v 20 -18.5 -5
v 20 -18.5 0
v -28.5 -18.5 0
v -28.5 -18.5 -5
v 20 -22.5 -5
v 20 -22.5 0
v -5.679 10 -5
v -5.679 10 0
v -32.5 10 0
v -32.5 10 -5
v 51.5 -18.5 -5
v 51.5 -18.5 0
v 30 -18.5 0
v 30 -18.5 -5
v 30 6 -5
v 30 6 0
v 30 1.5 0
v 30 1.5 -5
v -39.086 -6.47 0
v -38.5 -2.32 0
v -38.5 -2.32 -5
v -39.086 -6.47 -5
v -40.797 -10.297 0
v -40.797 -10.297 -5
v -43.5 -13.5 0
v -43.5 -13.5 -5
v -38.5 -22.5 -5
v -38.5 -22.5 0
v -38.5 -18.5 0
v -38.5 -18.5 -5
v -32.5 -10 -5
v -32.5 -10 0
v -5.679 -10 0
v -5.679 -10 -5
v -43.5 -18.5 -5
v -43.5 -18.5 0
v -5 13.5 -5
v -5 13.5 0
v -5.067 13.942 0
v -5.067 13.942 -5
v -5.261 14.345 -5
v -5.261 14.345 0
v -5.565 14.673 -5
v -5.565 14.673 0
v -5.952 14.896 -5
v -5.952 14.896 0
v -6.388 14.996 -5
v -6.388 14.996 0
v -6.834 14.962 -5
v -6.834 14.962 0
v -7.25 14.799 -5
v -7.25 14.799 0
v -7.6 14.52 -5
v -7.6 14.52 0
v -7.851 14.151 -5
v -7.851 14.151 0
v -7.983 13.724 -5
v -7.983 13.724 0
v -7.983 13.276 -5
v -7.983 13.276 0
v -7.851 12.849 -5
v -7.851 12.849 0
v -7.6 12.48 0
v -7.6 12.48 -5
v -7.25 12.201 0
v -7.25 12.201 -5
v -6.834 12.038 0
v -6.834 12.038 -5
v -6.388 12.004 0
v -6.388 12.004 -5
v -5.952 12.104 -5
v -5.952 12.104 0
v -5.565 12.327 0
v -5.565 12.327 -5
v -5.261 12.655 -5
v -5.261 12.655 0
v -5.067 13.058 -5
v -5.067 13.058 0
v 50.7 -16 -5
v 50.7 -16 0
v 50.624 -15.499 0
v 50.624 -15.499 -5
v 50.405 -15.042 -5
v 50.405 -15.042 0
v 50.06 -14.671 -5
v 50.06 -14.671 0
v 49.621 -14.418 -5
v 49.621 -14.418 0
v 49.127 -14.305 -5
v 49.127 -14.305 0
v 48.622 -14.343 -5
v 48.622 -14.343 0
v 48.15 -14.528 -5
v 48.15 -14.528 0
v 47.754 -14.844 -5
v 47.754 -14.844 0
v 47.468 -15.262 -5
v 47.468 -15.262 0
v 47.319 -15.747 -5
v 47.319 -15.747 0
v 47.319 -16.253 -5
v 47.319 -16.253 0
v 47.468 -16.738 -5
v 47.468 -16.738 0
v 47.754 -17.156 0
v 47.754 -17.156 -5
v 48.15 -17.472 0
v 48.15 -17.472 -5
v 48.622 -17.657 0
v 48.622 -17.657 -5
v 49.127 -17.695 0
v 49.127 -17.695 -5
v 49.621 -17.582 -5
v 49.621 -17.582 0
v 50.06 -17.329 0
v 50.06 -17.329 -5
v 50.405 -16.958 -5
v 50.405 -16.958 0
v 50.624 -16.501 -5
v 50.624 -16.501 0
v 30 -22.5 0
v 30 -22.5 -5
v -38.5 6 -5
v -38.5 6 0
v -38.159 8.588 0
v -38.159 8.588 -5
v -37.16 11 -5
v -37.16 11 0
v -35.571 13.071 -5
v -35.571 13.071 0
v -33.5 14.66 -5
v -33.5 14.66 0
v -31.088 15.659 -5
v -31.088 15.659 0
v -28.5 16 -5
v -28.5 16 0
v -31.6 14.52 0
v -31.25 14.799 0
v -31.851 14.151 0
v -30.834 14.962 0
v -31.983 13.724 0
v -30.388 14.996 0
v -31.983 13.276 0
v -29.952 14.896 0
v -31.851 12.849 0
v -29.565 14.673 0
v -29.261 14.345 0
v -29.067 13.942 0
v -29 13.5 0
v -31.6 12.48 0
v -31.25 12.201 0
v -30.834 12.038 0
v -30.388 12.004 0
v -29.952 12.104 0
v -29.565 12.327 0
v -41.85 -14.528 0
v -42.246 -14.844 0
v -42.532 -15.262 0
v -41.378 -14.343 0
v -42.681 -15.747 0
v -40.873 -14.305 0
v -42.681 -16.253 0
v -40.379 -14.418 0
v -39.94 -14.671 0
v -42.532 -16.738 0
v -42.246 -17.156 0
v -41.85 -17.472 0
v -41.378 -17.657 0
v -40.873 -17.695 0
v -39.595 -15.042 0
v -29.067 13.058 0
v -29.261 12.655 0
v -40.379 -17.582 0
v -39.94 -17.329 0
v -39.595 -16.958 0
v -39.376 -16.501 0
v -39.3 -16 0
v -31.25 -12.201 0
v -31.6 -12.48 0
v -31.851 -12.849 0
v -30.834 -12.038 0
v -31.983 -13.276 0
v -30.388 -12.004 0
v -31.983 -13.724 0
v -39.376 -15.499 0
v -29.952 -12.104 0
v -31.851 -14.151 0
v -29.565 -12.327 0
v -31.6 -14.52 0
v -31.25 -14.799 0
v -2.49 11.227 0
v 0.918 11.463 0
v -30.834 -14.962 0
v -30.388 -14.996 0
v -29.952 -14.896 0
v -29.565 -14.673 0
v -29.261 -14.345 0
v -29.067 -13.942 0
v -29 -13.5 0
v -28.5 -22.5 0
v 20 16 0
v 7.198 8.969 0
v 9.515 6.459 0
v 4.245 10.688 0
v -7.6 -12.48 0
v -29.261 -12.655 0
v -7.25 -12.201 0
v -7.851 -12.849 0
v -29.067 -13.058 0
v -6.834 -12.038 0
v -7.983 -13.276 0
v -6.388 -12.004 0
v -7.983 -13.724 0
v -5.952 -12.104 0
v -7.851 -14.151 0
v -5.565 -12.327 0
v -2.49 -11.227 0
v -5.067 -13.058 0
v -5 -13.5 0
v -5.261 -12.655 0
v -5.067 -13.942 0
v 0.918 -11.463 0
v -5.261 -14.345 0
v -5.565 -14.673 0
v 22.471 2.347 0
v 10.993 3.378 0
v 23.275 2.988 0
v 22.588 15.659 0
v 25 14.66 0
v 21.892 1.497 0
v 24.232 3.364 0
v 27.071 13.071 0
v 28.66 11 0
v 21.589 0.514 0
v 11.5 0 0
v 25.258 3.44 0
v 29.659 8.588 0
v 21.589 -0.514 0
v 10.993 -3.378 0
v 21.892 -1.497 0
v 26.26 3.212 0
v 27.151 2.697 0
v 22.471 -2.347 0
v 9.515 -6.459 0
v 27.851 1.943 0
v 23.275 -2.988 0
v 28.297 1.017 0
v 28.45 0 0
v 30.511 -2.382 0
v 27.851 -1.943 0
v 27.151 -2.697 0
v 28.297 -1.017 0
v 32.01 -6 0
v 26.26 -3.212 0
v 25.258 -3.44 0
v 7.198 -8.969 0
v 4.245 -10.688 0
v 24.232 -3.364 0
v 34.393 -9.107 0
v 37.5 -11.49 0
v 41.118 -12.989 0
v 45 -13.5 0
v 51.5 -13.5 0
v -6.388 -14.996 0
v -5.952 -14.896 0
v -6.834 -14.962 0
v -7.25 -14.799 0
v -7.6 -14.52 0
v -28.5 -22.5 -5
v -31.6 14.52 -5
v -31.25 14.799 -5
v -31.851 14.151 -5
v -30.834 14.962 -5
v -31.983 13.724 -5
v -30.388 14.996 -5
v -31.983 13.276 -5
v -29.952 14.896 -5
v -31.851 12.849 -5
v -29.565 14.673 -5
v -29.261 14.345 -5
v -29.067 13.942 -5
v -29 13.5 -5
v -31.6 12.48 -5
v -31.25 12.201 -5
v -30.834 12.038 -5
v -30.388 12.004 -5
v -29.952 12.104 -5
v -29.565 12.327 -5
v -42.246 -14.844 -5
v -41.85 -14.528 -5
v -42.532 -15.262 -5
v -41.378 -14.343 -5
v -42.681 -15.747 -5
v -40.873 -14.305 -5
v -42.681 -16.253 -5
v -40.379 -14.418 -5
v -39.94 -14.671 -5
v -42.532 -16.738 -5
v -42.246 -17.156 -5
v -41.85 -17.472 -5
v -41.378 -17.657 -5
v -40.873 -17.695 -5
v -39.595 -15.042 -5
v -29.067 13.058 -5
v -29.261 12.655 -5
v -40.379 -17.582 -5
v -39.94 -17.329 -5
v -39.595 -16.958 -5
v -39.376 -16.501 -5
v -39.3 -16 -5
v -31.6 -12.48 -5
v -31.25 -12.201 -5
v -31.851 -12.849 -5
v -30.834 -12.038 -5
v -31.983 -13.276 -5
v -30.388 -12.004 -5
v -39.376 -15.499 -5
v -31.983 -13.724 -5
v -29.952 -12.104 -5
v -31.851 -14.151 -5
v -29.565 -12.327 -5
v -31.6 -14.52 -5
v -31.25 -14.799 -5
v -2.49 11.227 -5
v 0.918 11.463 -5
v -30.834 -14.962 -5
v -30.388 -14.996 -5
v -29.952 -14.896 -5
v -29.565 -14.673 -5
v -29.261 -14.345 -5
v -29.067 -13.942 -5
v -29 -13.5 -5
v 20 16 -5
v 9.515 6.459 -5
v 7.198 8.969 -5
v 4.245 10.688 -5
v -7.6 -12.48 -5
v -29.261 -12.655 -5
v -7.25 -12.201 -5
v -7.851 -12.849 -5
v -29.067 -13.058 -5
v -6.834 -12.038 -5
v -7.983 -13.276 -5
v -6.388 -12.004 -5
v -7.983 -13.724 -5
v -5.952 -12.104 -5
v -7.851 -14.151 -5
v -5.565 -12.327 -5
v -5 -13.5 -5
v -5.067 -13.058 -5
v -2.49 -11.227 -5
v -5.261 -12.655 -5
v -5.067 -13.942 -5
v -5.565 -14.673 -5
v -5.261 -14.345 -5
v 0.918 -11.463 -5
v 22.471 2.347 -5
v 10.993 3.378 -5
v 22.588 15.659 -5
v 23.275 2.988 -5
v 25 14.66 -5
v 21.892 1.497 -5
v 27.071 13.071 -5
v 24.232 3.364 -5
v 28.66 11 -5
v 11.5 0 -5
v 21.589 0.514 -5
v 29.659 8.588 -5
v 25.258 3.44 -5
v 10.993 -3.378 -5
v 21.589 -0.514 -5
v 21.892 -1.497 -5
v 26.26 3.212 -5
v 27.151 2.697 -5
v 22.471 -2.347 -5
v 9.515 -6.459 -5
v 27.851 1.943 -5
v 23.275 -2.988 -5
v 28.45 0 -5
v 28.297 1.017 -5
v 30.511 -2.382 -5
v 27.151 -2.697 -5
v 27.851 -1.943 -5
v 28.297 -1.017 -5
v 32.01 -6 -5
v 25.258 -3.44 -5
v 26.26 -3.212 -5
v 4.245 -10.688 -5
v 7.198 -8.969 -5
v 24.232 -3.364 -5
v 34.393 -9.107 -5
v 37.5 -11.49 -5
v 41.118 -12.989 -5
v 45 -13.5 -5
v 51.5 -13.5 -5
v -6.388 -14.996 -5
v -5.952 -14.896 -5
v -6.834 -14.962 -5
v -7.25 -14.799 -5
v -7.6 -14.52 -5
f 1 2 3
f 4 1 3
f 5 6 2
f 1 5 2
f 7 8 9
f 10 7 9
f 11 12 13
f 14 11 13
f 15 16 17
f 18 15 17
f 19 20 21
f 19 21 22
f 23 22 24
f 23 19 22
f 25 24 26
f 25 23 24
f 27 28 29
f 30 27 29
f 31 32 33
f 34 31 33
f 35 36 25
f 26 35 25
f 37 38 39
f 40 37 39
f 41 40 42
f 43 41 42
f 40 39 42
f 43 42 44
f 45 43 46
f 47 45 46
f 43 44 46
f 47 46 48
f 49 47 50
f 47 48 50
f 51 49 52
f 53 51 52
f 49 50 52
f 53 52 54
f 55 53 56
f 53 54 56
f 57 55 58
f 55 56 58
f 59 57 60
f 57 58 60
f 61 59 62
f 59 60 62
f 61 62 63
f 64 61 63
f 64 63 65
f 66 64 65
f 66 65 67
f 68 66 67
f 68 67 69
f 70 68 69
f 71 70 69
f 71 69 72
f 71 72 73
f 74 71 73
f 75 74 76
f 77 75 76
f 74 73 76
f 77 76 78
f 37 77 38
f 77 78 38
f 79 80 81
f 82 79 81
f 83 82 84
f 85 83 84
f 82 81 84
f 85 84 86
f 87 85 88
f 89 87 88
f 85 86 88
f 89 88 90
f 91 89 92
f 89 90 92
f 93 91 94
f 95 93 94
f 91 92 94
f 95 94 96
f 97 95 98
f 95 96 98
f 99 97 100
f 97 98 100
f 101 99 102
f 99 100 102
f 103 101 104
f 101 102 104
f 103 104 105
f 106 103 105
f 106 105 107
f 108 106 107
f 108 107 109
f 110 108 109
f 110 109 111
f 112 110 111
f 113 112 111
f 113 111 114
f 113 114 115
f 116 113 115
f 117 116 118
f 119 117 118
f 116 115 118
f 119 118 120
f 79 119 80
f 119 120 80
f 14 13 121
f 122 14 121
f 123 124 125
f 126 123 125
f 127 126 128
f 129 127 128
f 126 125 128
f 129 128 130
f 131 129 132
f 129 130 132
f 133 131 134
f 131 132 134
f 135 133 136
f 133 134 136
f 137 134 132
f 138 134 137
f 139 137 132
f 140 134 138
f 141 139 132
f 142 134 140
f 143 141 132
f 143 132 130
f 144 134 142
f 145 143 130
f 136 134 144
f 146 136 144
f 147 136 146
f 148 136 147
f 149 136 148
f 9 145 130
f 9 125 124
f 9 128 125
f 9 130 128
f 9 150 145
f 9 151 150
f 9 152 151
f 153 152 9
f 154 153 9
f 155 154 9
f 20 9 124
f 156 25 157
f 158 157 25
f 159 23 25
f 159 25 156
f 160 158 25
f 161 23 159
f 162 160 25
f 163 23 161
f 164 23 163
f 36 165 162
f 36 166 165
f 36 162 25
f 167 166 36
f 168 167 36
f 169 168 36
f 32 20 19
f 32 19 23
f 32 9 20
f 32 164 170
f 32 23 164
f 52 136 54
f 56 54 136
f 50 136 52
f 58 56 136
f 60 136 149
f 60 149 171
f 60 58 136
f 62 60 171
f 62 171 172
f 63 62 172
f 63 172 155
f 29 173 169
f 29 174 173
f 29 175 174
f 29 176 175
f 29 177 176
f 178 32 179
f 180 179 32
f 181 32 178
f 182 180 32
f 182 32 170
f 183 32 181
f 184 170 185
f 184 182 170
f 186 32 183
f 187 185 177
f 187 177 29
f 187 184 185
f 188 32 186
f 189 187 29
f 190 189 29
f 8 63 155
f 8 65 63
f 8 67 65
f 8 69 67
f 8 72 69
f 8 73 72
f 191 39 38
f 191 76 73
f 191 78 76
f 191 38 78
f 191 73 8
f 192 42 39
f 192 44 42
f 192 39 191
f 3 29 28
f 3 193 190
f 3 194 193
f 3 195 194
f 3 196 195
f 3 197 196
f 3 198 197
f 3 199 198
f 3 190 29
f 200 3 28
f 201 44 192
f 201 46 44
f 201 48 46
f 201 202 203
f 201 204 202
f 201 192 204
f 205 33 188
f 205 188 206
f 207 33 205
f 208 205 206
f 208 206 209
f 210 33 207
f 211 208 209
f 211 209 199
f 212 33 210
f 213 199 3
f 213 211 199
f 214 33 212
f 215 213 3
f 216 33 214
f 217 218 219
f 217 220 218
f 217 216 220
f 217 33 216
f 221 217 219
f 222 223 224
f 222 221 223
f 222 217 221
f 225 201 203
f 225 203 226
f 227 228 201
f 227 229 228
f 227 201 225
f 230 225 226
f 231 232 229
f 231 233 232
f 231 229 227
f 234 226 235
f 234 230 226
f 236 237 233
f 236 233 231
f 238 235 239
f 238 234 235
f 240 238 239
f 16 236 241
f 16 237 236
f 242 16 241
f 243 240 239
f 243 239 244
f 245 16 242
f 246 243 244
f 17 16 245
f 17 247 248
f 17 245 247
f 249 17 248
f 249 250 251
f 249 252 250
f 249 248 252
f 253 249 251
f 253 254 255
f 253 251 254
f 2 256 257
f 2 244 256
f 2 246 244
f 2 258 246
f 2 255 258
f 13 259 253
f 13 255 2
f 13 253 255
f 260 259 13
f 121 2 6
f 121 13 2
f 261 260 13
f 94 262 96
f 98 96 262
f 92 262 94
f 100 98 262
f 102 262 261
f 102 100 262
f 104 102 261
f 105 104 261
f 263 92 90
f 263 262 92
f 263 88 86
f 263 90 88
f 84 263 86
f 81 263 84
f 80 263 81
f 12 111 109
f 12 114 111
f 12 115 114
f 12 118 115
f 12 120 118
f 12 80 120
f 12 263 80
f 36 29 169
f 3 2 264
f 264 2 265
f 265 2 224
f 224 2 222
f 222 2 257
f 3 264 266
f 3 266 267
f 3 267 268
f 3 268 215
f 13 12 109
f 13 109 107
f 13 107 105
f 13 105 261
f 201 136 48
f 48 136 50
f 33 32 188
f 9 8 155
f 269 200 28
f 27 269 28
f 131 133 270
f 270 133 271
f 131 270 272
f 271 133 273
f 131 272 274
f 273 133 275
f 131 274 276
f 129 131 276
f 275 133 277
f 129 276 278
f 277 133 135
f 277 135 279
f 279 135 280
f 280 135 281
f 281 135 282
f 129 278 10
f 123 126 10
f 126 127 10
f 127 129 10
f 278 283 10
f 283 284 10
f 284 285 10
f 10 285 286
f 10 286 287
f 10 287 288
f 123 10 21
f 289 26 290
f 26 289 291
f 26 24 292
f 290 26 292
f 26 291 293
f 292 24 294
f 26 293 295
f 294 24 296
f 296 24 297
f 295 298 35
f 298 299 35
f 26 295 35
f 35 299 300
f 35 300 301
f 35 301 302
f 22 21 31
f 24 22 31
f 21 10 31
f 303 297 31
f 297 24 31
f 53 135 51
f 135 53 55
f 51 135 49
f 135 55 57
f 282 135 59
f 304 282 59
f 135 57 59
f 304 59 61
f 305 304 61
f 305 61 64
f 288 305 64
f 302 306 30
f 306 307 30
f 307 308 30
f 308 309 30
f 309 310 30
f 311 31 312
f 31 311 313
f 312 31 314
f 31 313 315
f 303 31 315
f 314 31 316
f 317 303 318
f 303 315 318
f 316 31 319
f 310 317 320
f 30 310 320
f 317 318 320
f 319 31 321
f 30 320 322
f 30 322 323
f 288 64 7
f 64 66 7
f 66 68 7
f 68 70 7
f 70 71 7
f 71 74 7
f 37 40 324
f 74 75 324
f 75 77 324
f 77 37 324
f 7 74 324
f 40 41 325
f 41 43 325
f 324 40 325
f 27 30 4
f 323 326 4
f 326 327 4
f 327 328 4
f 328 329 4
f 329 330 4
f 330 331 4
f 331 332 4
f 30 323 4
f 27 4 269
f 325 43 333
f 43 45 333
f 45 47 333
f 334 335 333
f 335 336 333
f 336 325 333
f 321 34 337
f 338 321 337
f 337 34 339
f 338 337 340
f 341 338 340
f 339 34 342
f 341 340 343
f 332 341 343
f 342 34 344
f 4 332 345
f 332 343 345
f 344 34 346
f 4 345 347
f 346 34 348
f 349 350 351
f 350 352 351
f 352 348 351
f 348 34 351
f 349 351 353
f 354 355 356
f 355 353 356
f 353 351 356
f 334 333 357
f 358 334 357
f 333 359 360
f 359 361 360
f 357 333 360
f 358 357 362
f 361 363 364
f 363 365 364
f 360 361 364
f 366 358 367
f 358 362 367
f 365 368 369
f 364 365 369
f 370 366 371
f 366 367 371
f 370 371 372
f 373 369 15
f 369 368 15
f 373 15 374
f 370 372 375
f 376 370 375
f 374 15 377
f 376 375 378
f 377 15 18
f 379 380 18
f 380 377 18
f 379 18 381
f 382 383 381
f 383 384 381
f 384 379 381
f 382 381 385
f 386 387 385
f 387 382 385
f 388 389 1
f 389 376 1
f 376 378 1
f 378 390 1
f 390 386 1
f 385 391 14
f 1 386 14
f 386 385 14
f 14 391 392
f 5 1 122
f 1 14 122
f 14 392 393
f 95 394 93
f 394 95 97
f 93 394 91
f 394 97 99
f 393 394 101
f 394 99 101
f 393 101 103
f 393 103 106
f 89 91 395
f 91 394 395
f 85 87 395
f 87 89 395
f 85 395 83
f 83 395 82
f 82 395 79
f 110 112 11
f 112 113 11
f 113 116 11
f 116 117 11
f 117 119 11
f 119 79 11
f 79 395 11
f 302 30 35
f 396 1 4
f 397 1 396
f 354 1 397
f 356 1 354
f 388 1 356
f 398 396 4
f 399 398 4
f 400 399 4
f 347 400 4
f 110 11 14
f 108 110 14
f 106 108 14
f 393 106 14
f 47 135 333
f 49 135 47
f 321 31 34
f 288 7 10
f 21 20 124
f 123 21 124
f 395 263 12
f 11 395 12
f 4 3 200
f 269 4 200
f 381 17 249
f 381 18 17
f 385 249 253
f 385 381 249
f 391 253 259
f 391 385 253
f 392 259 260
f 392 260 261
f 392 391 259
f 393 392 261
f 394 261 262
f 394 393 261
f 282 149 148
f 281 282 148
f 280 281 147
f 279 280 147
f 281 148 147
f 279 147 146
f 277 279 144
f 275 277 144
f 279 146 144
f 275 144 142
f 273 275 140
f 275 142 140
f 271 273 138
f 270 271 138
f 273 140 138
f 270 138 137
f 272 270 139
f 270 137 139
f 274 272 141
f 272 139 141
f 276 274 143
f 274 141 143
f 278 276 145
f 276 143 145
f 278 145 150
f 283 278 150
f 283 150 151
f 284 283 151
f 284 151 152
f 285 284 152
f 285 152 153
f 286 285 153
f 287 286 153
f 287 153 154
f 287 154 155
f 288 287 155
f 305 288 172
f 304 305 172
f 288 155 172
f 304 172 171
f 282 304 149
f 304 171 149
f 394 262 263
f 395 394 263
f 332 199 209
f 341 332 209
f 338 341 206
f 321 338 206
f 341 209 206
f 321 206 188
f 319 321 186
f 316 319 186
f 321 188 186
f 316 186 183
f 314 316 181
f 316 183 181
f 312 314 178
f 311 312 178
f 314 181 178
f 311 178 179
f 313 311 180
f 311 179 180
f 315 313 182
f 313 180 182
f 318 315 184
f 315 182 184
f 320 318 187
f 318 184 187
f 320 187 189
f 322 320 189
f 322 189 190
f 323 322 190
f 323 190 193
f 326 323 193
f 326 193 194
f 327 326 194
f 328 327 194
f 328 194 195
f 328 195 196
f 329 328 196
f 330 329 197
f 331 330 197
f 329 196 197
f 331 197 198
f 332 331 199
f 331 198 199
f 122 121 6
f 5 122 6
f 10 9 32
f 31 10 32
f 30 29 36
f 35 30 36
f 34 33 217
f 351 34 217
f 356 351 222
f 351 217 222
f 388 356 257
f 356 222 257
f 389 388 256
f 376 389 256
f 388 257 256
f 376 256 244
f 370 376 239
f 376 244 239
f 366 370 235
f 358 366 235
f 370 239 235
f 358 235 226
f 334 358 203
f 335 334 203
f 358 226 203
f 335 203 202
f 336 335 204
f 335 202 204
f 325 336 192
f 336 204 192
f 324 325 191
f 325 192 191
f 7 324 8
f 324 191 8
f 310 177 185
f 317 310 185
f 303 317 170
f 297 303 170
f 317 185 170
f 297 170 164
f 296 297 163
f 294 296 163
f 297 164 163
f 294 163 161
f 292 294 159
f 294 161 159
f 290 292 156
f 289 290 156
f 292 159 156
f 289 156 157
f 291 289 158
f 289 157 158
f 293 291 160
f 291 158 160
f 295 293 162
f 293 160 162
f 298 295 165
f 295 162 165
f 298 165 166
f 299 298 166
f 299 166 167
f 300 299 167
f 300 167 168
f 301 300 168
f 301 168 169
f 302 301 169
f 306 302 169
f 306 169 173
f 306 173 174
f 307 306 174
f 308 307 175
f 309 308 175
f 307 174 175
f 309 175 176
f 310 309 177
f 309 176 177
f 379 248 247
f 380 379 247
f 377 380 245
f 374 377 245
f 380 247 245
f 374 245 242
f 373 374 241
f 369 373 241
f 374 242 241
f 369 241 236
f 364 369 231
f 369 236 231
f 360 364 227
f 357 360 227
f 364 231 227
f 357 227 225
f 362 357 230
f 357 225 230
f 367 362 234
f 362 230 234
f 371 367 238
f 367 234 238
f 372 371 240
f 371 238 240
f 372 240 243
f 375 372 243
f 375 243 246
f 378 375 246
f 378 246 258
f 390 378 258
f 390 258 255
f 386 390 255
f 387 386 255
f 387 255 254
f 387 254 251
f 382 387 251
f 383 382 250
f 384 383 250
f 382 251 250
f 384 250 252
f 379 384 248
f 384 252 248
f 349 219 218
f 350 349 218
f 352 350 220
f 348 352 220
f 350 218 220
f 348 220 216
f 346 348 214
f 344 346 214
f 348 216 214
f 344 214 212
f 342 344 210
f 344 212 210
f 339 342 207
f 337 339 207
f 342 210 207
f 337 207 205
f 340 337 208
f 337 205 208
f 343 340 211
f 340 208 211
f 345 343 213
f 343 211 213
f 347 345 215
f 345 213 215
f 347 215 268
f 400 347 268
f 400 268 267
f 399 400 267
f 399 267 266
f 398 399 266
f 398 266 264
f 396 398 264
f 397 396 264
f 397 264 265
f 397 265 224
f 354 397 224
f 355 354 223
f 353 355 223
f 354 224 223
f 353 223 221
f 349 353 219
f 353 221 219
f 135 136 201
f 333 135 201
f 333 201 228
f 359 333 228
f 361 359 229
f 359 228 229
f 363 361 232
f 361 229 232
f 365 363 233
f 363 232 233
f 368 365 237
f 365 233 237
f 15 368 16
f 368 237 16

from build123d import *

# Parameters (mm, degrees)
SKETCH1_R          = 3.45
SKETCH1_R_2        = 1.5
SKETCH1_R_3        = 1.7
BASE_FLANGE1_DEPTH = 5
FILLET1_R          = 15
FILLET2_R          = 15


# Sheet-metal steps are written as plain solids
with BuildPart() as part:
    # Sketch1 → Base-Flange1 (new body)
    with BuildSketch(Plane.XY):
        with BuildLine():
            Line((-28.5, 16), (20, 16))
            ThreePointArc((20, 16), (27.071067812, 13.071067812), (30, 6))
            Line((30, 6), (30, -13.5))
            Line((30, -13.5), (51.5, -13.5))
            Line((51.5, -13.5), (51.5, -18.5))
            Line((51.5, -18.5), (30, -18.5))
            Line((30, -18.5), (30, -22.5))
            Line((30, -22.5), (20, -22.5))
            Line((20, -22.5), (20, -18.5))
            Line((20, -18.5), (-28.5, -18.5))
            Line((-28.5, -18.5), (-28.5, -22.5))
            Line((-28.5, -22.5), (-38.5, -22.5))
            Line((-38.5, -22.5), (-38.5, -18.5))
            Line((-38.5, -18.5), (-43.5, -18.5))
            Line((-43.5, -18.5), (-43.5, -13.5))
            Line((-43.5, -13.5), (-38.5, -13.5))
            Line((-38.5, -13.5), (-38.5, 6))
            ThreePointArc((-38.5, 6), (-35.571067812, 13.071067812), (-28.5, 16))
        make_face()
        with Locations((25, 0)):
            Circle(SKETCH1_R, mode=Mode.SUBTRACT)
        with Locations((-6.5, 13.5)):
            Circle(SKETCH1_R_2, mode=Mode.SUBTRACT)
        with Locations((-30.5, 13.5)):
            Circle(SKETCH1_R_2, mode=Mode.SUBTRACT)
        with Locations((-30.5, -13.5)):
            Circle(SKETCH1_R_2, mode=Mode.SUBTRACT)
        with Locations((-6.5, -13.5)):
            Circle(SKETCH1_R_2, mode=Mode.SUBTRACT)
        with Locations((-41, -16)):
            Circle(SKETCH1_R_3, mode=Mode.SUBTRACT)
        with Locations((49, -16)):
            Circle(SKETCH1_R_3, mode=Mode.SUBTRACT)
        with BuildLine():
            Line((-5.678908346, 10), (-32.5, 10))
            Line((-32.5, 10), (-32.5, -10))
            Line((-32.5, -10), (-5.678908346, -10))
            ThreePointArc((-5.678908346, -10), (11.5, 0), (-5.678908346, 10))
        make_face(mode=Mode.SUBTRACT)
    extrude(amount=-BASE_FLANGE1_DEPTH)

    # Fillet1
    fillet1_edges = [part.edges().sort_by_distance(p)[0] for p in [
        (30, -13.5, -2.5),
    ]]
    fillet(fillet1_edges, radius=FILLET1_R)

    # Fillet2
    # the kernel refuses this fillet: 15 mm, written as the material it adds along each edge
    with BuildSketch(Plane(origin=(-38.5, -13.5, 0), x_dir=(0, 1, 0), z_dir=(0, 0, -1))) as fillet2_piece_1:
        with BuildLine():
            CenterArc((11.180339887, -15), FILLET2_R, 90, 48.189685104)
            Line((0, -5), (-0.223606798, -4.8))
            ThreePointArc((-0.223606798, -4.8), (-0.3, -2.5), (-0.3, 0))
            Line((-0.3, 0), (0, 0.3))
            Line((0, 0.3), (11.180339887, 0.3))
            Line((11.180339887, 0.3), (11.180339887, 0))
        make_face()
    extrude(amount=5)


solid = part.part
